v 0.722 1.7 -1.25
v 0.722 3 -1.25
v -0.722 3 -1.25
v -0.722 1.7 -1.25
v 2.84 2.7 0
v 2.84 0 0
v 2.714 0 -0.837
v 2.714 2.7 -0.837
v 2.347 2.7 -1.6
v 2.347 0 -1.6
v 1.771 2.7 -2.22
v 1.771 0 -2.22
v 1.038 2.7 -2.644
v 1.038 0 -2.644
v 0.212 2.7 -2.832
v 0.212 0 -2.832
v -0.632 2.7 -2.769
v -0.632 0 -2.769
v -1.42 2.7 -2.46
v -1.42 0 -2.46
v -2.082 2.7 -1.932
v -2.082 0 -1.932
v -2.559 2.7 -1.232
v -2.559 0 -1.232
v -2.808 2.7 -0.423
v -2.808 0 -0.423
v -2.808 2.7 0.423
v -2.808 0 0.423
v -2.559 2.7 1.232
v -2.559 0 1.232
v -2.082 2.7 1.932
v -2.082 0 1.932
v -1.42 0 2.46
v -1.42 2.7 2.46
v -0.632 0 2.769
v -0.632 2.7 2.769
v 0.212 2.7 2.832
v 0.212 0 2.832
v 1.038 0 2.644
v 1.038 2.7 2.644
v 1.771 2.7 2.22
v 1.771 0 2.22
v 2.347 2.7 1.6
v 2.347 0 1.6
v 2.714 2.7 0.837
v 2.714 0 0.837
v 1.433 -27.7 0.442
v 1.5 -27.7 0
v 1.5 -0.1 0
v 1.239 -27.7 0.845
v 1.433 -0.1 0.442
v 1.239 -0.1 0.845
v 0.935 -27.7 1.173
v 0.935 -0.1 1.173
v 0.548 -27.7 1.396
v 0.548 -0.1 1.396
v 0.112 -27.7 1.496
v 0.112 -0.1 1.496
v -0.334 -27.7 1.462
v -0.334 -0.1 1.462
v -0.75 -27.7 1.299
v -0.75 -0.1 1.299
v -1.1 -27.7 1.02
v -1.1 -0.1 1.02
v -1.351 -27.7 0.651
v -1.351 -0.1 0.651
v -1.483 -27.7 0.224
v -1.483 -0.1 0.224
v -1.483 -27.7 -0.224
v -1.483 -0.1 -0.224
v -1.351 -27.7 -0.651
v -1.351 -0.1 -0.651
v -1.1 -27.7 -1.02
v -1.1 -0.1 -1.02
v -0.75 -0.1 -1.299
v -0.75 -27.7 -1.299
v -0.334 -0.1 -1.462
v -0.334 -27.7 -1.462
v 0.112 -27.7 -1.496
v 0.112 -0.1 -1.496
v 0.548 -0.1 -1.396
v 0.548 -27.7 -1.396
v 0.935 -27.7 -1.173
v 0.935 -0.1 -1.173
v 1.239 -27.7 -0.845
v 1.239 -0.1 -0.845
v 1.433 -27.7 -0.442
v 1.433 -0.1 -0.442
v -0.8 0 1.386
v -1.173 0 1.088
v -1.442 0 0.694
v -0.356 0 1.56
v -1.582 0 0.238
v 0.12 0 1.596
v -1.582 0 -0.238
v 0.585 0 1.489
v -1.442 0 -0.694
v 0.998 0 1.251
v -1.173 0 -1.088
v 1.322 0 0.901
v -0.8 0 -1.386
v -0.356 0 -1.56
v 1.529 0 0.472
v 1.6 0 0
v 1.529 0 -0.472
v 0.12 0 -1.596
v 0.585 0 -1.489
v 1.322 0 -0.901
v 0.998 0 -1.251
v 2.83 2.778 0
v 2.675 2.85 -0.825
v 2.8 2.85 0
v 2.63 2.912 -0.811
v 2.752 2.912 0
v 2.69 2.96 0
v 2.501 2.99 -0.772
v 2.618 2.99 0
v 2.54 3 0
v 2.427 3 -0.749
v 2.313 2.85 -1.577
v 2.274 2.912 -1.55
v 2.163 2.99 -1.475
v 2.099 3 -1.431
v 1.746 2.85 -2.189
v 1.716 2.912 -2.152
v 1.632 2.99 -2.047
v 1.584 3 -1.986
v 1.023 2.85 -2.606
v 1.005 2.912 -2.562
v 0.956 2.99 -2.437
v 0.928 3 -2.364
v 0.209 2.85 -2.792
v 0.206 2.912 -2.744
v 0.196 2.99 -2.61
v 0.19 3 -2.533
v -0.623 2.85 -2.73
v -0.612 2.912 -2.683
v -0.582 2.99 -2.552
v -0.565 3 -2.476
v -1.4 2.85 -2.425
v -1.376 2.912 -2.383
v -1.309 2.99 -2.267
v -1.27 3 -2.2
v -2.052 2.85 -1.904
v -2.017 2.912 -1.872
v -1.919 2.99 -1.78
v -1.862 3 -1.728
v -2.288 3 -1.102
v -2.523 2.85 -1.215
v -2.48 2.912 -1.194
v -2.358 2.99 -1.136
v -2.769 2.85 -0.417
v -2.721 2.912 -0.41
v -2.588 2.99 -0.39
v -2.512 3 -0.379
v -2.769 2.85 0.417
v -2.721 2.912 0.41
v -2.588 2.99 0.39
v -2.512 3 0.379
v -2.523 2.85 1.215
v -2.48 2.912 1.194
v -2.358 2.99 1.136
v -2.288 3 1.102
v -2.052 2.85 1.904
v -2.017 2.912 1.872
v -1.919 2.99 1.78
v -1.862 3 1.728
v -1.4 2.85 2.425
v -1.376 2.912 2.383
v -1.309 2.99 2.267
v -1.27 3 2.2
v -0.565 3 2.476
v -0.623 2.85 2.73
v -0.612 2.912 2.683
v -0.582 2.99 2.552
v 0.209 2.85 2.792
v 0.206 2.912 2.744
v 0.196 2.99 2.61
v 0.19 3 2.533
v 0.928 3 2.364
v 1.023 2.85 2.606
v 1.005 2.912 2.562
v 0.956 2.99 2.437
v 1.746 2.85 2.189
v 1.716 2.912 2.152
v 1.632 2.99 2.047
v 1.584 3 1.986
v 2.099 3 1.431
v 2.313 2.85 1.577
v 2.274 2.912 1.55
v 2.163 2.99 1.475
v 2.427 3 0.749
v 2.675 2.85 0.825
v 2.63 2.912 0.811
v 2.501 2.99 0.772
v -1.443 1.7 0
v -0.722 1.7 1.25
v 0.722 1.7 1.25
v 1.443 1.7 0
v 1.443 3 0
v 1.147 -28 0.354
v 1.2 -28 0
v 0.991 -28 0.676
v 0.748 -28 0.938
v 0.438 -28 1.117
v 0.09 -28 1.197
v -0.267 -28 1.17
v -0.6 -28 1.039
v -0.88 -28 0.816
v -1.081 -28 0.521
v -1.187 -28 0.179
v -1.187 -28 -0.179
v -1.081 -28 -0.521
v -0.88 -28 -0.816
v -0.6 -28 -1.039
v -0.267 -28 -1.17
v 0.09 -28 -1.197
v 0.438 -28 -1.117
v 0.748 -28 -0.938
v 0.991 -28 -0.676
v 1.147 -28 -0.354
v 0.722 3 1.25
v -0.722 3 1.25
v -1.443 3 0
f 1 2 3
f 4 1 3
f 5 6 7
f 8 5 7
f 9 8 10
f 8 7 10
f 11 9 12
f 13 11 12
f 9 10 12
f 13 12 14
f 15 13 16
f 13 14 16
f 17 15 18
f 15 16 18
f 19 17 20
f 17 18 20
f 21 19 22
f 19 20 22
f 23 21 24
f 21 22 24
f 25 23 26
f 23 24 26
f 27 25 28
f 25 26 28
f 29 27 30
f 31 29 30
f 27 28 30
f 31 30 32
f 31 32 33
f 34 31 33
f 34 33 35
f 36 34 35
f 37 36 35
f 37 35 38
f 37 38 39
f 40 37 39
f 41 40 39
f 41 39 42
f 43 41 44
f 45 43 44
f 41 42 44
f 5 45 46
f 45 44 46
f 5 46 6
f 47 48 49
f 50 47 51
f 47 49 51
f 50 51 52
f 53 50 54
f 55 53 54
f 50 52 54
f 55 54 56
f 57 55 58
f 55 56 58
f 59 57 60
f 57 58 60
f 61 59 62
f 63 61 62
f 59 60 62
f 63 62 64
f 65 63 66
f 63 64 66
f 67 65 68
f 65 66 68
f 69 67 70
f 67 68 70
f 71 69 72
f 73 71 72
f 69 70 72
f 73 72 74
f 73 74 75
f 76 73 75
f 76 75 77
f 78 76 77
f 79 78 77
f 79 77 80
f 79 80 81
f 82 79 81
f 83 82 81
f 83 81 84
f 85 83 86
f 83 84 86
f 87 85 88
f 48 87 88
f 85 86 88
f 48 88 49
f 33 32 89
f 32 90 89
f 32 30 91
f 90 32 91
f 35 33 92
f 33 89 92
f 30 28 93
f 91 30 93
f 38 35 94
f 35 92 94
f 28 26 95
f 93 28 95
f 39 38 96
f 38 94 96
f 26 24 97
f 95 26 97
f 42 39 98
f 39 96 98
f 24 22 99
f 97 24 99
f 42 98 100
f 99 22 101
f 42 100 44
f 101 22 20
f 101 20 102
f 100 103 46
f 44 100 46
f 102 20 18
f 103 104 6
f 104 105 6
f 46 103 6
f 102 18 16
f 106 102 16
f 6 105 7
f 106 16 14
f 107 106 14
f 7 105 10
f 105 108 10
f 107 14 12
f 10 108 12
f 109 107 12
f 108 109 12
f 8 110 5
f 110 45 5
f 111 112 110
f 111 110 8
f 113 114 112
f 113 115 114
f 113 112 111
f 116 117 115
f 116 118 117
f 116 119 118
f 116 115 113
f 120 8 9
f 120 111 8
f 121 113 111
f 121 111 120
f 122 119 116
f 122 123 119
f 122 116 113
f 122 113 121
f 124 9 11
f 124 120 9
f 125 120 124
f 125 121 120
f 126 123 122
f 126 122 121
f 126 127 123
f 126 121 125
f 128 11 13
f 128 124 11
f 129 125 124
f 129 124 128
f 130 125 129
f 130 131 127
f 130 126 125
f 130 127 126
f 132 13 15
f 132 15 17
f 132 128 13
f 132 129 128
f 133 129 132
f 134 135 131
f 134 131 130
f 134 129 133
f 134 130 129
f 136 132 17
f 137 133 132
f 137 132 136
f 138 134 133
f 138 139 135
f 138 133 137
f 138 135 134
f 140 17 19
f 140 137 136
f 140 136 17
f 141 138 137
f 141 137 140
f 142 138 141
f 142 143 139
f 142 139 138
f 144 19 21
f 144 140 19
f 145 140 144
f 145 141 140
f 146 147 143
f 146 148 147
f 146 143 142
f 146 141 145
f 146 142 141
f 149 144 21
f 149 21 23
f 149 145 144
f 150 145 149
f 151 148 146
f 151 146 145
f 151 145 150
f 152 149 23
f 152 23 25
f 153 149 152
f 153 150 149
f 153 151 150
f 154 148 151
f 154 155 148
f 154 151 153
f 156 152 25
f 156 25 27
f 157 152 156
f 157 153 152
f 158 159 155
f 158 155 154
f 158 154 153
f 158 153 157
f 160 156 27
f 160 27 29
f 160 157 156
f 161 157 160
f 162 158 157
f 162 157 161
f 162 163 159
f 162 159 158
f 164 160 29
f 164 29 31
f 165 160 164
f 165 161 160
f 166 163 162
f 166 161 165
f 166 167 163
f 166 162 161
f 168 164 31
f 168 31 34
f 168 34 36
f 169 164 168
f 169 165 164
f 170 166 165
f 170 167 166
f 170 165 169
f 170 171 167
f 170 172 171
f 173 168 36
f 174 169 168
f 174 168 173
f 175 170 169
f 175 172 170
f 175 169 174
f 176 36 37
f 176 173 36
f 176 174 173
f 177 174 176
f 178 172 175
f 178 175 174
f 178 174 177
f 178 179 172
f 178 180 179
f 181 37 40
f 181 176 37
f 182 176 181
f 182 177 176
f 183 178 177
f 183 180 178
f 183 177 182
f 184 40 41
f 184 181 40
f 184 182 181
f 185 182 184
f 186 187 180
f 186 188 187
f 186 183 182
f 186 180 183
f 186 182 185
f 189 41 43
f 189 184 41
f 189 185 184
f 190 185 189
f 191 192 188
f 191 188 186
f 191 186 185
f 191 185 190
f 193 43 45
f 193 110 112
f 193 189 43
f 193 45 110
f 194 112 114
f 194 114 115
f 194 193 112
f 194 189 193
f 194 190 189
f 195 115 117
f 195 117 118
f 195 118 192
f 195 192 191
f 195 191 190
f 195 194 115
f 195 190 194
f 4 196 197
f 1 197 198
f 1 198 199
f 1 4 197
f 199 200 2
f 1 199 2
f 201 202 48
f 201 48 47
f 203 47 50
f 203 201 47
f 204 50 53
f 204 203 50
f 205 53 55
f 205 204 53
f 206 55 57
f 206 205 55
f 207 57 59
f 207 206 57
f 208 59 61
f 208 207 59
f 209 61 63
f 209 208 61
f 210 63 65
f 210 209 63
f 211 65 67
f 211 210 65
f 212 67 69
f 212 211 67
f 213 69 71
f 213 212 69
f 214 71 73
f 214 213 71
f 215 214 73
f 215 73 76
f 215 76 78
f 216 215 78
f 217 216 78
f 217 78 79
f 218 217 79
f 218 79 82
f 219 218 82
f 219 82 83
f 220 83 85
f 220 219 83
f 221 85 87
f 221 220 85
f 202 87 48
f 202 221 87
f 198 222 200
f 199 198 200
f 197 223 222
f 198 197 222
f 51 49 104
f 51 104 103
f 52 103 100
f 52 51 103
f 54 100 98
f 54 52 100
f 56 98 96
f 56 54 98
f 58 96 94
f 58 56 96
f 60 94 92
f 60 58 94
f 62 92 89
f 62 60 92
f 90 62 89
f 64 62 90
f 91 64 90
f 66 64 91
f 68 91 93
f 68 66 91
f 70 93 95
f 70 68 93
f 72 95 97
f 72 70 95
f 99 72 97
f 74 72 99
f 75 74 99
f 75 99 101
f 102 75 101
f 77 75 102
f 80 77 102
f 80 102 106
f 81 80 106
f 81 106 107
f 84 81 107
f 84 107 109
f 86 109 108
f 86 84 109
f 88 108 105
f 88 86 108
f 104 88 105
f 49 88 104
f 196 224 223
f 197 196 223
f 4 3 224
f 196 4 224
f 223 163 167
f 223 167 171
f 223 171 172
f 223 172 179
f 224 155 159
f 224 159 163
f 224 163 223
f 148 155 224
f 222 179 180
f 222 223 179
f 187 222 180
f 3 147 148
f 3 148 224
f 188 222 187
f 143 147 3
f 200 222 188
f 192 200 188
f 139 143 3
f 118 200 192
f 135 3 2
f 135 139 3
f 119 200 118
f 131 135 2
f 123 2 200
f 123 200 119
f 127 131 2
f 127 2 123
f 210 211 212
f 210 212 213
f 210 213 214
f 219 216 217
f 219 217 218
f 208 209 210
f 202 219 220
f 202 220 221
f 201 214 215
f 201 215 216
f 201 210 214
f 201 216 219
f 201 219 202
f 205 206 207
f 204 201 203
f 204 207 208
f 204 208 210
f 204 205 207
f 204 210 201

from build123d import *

# Parameters (mm, degrees)
SKETCH_1_R          = 2.84
EXTRUDE_1_DEPTH     = 3
CUT_EXTRUDE_1_DEPTH = 1.3
SKETCH_3_R          = 1.5
EXTRUDE_2_DEPTH     = 28
CHAMFER_1_SIZE      = 0.3
FILLET_1_R          = 0.3
CHAMFER_2_SIZE      = 0.1


with BuildPart() as part:
    # 草图1 → 凸台-拉伸1 (new body)
    with BuildSketch(Plane(origin=(0, 0, 0), x_dir=(1, 0, 0), z_dir=(0, 1, 0))):
        Circle(SKETCH_1_R)
    extrude(amount=EXTRUDE_1_DEPTH)

    # 草图2 → 切除-拉伸1 (cut)
    with BuildSketch(Plane(origin=(0, 3, 0), x_dir=(1, 0, 0), z_dir=(0, 1, 0))):
        Polygon((1.443375673, 0), (0.721687836, 1.25), (-0.721687836, 1.25), (-1.443375673, 0), (-0.721687836, -1.25), (0.721687836, -1.25), align=None)
    extrude(amount=-CUT_EXTRUDE_1_DEPTH, mode=Mode.SUBTRACT)

    # 草图3 → 凸台-拉伸2 (add)
    with BuildSketch(Plane.XZ):
        Circle(SKETCH_3_R)
    extrude(amount=EXTRUDE_2_DEPTH)

    # 倒角1
    chamfer_1_edges = [part.edges().sort_by_distance(p)[0] for p in [
        (-1.5, -28, 0),
    ]]
    chamfer(chamfer_1_edges, length=CHAMFER_1_SIZE)

    # 圆角1
    fillet_1_edges = [part.edges().sort_by_distance(p)[0] for p in [
        (-2.84, 3, 0),
    ]]
    fillet(fillet_1_edges, radius=FILLET_1_R)

    # 倒角2
    chamfer_2_edges = [part.edges().sort_by_distance(p)[0] for p in [
        (-1.5, 0, 0),
    ]]
    chamfer(chamfer_2_edges, length=CHAMFER_2_SIZE)


solid = part.part
